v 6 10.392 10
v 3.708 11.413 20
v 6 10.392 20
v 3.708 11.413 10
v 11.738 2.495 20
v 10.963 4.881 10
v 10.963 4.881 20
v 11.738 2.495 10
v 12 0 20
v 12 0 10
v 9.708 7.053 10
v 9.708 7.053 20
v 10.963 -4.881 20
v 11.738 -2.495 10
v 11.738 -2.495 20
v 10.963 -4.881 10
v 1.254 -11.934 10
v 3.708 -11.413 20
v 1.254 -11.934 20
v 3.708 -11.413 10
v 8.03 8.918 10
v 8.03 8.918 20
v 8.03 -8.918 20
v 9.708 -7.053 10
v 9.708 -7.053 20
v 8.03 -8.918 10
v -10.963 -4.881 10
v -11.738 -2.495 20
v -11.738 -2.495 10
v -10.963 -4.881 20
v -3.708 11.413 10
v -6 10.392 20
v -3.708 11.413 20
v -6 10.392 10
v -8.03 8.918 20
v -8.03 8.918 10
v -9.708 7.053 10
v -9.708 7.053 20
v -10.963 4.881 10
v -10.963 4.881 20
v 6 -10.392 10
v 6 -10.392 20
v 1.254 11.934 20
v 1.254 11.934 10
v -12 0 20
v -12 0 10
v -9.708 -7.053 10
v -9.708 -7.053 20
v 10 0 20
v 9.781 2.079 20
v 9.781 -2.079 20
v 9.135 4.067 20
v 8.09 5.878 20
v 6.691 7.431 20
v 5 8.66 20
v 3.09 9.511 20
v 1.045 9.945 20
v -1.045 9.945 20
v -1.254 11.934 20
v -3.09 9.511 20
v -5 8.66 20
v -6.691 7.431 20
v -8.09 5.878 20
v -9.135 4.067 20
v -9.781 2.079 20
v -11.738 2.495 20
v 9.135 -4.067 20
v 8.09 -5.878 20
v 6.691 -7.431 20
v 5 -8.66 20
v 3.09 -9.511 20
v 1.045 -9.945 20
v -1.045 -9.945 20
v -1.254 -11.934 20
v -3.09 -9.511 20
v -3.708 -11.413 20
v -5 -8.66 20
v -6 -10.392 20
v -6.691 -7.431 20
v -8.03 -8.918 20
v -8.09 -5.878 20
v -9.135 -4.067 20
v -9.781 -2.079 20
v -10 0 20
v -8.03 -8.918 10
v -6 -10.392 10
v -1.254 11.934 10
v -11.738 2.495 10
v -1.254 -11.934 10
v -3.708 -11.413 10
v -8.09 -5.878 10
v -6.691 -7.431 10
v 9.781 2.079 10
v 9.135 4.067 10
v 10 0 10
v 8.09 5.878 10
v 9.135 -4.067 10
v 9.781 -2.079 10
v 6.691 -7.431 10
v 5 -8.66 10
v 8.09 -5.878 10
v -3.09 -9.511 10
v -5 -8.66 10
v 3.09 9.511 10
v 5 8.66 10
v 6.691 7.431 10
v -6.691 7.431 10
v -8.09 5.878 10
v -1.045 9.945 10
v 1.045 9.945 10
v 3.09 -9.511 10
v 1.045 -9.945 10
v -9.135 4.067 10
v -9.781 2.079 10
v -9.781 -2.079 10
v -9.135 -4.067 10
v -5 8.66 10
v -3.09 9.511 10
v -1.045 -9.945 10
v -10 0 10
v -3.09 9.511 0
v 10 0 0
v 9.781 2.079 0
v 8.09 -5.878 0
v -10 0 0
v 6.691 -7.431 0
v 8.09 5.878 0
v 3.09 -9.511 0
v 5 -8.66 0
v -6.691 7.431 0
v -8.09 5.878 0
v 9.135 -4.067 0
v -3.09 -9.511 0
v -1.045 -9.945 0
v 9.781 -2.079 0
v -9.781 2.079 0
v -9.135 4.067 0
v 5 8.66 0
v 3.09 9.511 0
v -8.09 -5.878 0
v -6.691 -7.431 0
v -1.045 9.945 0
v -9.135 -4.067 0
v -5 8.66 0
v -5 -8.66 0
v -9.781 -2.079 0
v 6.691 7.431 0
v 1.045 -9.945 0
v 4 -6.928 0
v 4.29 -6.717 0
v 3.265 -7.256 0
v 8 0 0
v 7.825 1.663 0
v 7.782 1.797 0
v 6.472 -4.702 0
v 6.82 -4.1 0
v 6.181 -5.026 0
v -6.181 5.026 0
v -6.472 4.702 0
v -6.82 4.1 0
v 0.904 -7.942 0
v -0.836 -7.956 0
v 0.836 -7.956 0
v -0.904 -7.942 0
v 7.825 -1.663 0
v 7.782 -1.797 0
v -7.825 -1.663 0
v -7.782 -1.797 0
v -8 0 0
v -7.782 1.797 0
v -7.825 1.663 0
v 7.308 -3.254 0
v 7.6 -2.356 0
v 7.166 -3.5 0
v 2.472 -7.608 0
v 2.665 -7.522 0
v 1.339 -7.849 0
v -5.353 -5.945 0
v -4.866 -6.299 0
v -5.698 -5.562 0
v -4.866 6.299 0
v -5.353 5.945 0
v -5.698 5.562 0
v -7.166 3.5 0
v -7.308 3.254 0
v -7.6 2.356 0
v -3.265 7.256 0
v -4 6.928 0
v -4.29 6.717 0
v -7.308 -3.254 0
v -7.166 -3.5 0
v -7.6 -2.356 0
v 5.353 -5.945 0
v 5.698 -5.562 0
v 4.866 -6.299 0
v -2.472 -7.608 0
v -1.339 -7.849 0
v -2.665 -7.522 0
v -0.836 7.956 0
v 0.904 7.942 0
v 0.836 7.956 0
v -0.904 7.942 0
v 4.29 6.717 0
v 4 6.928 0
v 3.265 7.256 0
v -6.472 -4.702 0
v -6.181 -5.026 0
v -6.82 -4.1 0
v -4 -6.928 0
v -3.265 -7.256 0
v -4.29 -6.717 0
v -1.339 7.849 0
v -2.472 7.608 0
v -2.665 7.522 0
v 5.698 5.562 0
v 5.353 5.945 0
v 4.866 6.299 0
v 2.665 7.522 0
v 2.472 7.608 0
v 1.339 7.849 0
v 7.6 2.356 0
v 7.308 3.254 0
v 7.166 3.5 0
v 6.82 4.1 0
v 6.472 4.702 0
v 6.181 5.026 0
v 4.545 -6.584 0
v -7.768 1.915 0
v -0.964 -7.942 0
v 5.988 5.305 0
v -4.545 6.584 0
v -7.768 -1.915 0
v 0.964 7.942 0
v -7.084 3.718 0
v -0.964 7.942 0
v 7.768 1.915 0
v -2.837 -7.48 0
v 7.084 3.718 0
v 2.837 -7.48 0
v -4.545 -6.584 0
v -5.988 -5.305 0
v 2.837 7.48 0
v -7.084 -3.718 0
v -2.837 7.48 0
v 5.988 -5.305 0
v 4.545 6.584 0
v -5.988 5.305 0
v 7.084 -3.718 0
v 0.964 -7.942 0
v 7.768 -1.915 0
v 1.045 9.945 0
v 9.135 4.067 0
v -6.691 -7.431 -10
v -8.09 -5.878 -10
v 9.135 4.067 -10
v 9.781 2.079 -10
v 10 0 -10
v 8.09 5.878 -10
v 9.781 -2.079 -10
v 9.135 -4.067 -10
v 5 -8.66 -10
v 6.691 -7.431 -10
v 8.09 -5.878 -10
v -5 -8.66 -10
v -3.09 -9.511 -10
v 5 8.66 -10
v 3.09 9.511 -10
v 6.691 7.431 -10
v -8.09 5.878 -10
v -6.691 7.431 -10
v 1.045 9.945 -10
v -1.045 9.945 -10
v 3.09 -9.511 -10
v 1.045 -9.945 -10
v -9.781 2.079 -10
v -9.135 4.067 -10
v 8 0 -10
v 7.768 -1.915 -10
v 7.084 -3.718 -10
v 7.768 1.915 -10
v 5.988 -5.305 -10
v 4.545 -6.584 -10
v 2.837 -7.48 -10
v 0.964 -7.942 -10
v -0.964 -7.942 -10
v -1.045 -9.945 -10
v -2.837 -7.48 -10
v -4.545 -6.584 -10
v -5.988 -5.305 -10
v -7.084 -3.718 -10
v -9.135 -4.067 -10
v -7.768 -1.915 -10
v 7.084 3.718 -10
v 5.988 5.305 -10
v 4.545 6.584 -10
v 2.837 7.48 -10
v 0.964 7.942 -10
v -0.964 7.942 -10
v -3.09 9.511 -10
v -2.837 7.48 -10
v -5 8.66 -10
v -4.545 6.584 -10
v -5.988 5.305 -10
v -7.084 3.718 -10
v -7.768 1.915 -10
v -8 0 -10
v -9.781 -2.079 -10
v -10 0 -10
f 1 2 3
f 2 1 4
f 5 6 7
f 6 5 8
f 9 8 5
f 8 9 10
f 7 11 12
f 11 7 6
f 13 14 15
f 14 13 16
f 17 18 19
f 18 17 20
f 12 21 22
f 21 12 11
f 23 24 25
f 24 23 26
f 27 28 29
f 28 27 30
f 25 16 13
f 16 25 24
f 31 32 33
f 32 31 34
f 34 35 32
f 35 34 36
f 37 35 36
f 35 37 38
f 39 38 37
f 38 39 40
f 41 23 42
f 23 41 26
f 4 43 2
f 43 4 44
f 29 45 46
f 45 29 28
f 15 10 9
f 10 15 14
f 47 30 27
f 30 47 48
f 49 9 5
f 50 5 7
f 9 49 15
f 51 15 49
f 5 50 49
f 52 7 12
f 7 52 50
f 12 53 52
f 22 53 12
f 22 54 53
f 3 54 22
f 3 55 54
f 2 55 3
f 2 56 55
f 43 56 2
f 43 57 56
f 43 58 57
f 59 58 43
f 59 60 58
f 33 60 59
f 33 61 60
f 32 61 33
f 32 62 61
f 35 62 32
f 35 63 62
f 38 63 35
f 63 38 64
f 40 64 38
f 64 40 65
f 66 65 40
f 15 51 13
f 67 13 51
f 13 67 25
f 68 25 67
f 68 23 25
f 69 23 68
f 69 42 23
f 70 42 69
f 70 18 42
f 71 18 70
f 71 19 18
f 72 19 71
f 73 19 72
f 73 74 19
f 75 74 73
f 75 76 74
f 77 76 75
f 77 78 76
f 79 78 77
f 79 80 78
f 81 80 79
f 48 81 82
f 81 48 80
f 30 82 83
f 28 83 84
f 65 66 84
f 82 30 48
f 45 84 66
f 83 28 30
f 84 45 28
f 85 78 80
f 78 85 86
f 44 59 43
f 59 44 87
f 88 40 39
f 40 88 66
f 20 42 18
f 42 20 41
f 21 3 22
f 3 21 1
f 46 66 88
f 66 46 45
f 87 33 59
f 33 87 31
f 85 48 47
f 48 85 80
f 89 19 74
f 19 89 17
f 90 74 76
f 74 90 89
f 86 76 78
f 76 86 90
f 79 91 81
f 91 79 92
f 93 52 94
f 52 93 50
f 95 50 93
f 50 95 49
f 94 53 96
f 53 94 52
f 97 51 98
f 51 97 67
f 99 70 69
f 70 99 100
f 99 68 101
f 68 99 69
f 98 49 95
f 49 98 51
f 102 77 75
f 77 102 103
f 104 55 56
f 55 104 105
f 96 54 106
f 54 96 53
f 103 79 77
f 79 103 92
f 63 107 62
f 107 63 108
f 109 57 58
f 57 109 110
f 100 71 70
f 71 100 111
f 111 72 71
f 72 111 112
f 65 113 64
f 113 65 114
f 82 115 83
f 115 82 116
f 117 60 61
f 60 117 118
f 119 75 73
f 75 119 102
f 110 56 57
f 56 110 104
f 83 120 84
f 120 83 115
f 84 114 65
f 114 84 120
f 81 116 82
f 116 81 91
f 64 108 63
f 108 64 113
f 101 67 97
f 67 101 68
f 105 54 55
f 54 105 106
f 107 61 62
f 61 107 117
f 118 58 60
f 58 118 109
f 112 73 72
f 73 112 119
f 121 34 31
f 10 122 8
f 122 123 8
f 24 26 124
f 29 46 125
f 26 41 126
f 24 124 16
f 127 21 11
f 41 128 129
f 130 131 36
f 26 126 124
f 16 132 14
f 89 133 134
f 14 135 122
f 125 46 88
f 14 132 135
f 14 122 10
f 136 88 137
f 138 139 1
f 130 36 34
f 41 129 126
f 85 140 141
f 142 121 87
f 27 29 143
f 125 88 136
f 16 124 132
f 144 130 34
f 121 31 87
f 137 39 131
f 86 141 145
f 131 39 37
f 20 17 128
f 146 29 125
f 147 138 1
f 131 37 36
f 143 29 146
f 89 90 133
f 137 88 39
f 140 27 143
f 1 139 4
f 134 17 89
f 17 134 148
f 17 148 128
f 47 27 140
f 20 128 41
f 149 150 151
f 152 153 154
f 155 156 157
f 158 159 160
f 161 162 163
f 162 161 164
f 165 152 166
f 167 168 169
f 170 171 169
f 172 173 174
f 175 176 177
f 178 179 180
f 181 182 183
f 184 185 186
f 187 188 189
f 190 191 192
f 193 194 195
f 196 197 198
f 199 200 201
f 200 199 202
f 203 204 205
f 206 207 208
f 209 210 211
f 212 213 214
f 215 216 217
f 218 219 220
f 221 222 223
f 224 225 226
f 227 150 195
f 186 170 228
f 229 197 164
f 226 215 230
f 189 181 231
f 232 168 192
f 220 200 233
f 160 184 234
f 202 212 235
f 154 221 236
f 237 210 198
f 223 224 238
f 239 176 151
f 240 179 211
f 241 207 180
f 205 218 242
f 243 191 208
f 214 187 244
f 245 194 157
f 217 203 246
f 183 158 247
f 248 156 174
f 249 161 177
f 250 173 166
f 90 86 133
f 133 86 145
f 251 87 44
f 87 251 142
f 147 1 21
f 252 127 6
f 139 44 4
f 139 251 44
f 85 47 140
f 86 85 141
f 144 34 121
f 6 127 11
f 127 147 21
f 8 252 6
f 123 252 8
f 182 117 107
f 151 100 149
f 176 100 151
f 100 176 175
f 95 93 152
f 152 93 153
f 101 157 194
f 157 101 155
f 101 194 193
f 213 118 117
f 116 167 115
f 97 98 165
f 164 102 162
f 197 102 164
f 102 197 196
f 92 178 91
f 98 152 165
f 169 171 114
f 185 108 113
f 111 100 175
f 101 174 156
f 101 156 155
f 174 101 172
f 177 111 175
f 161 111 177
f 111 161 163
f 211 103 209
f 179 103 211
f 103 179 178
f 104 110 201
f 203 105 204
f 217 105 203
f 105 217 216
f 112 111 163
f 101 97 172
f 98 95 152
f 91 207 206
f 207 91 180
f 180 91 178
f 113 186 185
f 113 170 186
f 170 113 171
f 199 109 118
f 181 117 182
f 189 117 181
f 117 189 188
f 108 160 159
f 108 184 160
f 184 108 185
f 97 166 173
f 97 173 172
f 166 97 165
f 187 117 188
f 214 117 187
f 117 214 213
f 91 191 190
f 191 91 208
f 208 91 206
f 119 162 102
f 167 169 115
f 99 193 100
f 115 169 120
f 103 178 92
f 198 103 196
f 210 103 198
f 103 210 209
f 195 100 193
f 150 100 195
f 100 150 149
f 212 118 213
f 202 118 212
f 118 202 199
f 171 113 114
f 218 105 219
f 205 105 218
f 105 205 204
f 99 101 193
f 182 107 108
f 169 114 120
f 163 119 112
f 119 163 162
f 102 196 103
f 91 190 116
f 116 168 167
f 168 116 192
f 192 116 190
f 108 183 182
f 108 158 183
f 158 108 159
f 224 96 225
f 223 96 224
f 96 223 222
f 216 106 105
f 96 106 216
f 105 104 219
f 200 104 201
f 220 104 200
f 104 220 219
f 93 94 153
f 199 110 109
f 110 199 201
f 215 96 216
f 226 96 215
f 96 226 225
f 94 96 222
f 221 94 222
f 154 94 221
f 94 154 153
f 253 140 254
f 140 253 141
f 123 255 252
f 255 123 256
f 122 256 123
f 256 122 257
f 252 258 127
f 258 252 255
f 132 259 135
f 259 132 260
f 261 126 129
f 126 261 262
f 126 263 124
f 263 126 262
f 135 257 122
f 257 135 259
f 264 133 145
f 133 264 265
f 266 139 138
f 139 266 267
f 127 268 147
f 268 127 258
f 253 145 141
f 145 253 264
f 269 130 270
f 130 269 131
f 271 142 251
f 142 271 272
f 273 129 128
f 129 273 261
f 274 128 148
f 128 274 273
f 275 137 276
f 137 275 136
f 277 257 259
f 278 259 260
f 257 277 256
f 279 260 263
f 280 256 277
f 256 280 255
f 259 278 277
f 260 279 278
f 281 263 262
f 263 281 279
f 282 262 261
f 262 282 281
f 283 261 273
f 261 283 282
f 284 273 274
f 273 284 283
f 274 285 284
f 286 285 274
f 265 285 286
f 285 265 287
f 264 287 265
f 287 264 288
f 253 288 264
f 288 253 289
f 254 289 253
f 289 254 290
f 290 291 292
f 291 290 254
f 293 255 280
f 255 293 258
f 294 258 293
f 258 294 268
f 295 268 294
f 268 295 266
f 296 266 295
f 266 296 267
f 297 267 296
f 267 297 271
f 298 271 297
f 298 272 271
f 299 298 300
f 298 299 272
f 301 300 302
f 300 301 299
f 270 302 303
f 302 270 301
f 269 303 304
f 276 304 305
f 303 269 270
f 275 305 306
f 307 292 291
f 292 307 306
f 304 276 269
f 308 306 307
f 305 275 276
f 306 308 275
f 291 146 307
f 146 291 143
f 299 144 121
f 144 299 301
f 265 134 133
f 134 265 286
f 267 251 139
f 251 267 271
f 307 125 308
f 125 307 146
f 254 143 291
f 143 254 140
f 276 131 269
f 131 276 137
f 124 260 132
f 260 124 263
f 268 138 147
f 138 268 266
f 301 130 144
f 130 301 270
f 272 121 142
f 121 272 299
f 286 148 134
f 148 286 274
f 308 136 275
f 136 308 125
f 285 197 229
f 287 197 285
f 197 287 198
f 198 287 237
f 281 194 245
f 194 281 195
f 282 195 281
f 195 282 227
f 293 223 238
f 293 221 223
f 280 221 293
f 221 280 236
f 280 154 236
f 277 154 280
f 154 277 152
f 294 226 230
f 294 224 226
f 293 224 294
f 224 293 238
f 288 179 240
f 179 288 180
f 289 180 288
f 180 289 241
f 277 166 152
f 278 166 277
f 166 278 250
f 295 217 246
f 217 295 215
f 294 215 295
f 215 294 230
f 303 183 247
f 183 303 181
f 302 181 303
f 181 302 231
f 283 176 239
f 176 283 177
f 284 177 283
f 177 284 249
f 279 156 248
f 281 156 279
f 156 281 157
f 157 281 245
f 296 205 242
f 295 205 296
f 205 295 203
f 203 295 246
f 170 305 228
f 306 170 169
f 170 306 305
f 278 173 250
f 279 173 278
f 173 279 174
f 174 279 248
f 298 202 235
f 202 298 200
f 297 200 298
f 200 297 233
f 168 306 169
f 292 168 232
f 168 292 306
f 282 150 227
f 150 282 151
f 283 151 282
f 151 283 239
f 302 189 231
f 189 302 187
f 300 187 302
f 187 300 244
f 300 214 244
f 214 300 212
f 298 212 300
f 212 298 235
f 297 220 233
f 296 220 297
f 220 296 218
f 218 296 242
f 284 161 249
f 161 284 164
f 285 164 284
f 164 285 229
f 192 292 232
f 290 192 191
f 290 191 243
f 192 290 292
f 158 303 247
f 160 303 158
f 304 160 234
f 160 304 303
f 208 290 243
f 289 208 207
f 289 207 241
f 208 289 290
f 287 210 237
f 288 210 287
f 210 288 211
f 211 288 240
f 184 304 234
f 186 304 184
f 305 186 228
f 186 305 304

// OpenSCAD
tubo1 = 20;     //diametro externo

tubo2 = 16;

union() {
//
  translate([0,0,10])  
  difference() {

cylinder(h=10,r=tubo1/2+2,center=false); 

cylinder(h=10,r=tubo1/2,center=false); 
  }
  
  

  
  
  translate([0,0,0])  
    difference() {

cylinder(h=10,r1=tubo2/2+2,r2=tubo1/2+2,center=false); 

cylinder(h=10,r1=tubo2/2,r2=tubo1/2,center=false); 
  }
  
  
  
  translate([0,0,-10])  
    difference() {

cylinder(h=10,r=tubo2/2+2,center=false); 

cylinder(h=10,r=tubo2/2,center=false); 
  }
    }
